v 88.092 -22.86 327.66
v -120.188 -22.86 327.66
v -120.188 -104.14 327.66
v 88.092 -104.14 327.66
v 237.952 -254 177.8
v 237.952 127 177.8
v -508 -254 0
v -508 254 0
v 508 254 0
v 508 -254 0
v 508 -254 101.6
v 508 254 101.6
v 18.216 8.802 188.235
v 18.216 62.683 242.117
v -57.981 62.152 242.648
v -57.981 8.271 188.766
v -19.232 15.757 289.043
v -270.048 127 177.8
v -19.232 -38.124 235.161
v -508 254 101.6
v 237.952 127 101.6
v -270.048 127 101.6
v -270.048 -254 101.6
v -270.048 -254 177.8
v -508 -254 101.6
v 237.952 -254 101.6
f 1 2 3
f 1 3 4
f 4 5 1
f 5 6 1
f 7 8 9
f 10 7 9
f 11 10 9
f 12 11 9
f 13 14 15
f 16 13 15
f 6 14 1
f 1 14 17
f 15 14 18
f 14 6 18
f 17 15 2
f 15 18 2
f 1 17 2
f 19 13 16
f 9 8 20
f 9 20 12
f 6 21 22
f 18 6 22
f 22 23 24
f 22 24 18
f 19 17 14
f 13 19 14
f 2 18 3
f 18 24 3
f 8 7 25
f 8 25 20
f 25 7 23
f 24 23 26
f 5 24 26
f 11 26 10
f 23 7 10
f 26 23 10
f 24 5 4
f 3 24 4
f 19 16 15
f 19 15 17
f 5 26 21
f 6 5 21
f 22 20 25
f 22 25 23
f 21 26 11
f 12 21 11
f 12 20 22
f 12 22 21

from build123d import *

# Parameters (mm, degrees)
F0_W      = 1016
F0_H      = 508
F1_DEPTH  = 101.6
F4_W      = 237.9516797066
F4_H      = 381
F4_W_2    = 270.0483202934
F5_DEPTH  = 76.2
F5_FACE_W = 508
F5_FACE_H = 381
F6_DEPTH  = 149.86
F6_TAPER  = 45
F8_DEPTH  = 76.2


# Not quite as in the source:
# - the program builds the solid bodies; features that only make, move or delete a surface that nothing else refers to are left out


with BuildPart() as f1:
    # F0 (on Top) → F1 (new body)
    with BuildSketch(Plane.XY):
        Rectangle(F0_W, F0_H)
    extrude(amount=F1_DEPTH)

    # F4 (on face) → F5 (join)
    with BuildSketch(Plane.XY.offset(101.6)):
        with Locations((118.9758398533, -63.5)):
            Rectangle(F4_W, F4_H)
        with Locations((-135.0241601467, -63.5)):
            Rectangle(F4_W_2, F4_H)
    extrude(amount=F5_DEPTH)

    # F5_face (on face) → F6 (join, symmetric)
    with BuildSketch(Plane(origin=(-16.0483202934, -63.5, 177.8), x_dir=(1, 0, 0), z_dir=(0, 0, 1))):
        Rectangle(F5_FACE_W, F5_FACE_H)
    extrude(amount=F6_DEPTH, both=True, taper=F6_TAPER)

    # F7 (on face) → F8 (cut)
    with BuildSketch(Plane(origin=(0, 152.4, 152.4), x_dir=(-1, 0, 0), z_dir=(0, 0.7071067812, 0.7071067812))):
        Polygon((-18.2156057455, 126.8785575445), (57.9806947666, 127.6294159035), (19.232282097, 193.2419186418), align=None)
    extrude(amount=-F8_DEPTH, mode=Mode.SUBTRACT)


solid = f1.part
